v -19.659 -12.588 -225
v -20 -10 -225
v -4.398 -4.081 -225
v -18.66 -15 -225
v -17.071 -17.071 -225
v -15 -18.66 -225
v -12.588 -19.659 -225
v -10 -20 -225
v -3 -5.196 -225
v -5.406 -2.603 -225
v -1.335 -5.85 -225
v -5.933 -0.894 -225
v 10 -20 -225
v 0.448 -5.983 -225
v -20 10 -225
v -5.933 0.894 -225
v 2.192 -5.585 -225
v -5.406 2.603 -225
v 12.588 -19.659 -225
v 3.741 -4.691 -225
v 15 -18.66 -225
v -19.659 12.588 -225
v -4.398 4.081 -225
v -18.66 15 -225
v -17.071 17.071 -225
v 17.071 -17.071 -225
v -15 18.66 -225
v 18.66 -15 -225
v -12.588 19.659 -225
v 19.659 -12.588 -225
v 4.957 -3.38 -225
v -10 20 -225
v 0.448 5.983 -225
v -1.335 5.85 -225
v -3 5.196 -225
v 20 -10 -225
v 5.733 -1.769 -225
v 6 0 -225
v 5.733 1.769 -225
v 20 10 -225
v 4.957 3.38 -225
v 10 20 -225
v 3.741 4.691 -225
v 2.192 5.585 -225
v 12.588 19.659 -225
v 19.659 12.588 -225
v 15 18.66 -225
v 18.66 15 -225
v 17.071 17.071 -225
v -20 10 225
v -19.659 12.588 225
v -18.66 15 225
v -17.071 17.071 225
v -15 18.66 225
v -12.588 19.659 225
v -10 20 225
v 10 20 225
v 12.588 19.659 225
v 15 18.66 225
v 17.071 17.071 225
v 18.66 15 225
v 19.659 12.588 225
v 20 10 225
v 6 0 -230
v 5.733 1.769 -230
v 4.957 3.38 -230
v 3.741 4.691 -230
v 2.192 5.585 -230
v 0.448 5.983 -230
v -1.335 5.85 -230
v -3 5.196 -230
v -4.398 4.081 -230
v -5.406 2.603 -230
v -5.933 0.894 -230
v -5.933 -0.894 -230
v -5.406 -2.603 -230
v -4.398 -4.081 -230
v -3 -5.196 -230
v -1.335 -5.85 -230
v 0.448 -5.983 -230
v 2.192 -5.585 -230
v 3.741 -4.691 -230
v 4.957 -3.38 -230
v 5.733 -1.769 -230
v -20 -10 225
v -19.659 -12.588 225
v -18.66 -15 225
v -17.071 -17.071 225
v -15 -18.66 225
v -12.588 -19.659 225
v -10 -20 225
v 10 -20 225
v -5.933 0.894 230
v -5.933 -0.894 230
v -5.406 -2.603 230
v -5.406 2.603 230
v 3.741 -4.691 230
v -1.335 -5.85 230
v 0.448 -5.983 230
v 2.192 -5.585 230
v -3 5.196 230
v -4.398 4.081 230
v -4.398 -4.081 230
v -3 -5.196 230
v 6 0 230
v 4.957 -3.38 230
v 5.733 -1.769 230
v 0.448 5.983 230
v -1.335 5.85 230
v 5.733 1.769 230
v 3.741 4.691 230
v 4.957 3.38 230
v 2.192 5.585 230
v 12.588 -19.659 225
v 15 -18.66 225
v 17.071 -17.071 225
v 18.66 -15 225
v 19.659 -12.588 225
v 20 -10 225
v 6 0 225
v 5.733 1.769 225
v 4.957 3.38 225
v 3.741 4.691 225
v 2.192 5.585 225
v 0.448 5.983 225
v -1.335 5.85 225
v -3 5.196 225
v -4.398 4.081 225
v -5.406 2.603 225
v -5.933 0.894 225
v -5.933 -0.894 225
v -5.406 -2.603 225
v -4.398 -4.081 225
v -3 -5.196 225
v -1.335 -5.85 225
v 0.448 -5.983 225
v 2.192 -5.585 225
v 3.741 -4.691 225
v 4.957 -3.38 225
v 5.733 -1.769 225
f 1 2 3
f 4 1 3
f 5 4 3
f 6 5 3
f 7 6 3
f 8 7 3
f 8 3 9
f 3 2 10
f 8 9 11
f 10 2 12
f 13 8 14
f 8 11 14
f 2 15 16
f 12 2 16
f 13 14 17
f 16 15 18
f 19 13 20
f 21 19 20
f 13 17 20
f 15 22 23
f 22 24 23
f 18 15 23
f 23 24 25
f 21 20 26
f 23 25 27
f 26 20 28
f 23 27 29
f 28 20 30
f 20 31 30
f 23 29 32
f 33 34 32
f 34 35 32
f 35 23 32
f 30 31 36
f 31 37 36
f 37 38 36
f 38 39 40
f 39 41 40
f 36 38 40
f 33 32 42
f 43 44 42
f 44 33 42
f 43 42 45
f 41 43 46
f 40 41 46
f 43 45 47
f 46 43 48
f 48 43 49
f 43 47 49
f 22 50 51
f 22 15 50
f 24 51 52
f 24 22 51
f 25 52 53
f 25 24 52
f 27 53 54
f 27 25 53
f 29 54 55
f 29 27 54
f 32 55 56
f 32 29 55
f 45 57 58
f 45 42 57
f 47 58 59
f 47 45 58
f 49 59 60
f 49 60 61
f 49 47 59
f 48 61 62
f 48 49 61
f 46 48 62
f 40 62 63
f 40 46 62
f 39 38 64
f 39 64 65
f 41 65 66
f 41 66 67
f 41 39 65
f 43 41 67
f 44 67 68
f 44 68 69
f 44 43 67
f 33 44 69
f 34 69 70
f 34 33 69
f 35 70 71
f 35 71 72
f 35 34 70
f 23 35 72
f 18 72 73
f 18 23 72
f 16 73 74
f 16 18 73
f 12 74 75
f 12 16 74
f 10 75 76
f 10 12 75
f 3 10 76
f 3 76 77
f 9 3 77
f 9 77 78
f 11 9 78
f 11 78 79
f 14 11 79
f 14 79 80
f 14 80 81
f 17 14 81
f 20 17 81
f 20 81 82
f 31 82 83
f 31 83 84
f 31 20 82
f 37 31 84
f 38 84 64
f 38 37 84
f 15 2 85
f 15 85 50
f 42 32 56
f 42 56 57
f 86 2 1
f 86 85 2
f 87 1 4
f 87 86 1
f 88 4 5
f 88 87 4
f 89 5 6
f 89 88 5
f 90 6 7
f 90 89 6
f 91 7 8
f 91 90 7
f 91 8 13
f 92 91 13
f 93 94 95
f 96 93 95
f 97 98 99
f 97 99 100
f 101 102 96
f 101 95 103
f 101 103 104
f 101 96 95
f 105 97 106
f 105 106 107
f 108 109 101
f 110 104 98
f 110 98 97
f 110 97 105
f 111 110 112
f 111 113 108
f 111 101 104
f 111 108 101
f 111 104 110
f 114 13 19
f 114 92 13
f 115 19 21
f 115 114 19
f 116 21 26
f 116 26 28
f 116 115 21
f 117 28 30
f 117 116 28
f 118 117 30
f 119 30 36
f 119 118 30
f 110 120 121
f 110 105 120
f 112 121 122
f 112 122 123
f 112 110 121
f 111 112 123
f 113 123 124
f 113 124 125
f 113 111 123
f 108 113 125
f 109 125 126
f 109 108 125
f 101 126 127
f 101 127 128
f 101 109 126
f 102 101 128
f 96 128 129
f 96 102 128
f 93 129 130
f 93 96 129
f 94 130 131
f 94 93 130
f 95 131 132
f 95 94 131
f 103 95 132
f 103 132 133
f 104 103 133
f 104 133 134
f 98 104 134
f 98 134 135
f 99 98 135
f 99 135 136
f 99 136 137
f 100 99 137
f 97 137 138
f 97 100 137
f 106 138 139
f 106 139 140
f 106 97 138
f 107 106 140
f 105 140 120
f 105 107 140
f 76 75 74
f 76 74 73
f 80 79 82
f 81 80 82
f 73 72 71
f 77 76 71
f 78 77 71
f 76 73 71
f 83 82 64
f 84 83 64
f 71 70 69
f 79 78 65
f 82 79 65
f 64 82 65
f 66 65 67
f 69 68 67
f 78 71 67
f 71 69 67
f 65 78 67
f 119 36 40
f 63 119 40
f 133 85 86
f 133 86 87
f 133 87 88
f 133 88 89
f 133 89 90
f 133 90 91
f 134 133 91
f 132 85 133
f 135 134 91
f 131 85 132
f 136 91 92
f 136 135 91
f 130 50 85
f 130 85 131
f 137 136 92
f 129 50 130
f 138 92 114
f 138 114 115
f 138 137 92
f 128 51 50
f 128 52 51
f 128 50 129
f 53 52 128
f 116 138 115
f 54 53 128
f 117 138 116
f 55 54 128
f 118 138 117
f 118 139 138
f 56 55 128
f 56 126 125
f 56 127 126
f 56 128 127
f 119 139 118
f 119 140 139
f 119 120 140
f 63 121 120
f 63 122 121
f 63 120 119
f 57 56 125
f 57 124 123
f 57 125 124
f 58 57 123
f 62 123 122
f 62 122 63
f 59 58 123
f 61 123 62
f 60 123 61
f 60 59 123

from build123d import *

# Parameters (mm, degrees)
SKETCH_1_R      = 6
EXTRUDE_1_DEPTH = 230
SKETCH_2_W      = 40
SKETCH_2_H      = 40
EXTRUDE_2_DEPTH = 225
FILLET_1_R      = 10


with BuildPart() as part:
    # 草图1 → 凸台-拉伸1 (new, symmetric)
    with BuildSketch(Plane.XY):
        Circle(SKETCH_1_R)
    extrude(amount=EXTRUDE_1_DEPTH, both=True)

    # 草图2 → 凸台-拉伸2 (add, symmetric)
    with BuildSketch(Plane.XY):
        Rectangle(SKETCH_2_W, SKETCH_2_H)
    extrude(amount=EXTRUDE_2_DEPTH, both=True)

    # 圆角1
    fillet_1_edges = [part.edges().sort_by_distance(p)[0] for p in [
        (20, -20, 0),
        (20, 20, 0),
        (-20, 20, 0),
        (-20, -20, 0),
    ]]
    fillet(fillet_1_edges, radius=FILLET_1_R)


solid = part.part
